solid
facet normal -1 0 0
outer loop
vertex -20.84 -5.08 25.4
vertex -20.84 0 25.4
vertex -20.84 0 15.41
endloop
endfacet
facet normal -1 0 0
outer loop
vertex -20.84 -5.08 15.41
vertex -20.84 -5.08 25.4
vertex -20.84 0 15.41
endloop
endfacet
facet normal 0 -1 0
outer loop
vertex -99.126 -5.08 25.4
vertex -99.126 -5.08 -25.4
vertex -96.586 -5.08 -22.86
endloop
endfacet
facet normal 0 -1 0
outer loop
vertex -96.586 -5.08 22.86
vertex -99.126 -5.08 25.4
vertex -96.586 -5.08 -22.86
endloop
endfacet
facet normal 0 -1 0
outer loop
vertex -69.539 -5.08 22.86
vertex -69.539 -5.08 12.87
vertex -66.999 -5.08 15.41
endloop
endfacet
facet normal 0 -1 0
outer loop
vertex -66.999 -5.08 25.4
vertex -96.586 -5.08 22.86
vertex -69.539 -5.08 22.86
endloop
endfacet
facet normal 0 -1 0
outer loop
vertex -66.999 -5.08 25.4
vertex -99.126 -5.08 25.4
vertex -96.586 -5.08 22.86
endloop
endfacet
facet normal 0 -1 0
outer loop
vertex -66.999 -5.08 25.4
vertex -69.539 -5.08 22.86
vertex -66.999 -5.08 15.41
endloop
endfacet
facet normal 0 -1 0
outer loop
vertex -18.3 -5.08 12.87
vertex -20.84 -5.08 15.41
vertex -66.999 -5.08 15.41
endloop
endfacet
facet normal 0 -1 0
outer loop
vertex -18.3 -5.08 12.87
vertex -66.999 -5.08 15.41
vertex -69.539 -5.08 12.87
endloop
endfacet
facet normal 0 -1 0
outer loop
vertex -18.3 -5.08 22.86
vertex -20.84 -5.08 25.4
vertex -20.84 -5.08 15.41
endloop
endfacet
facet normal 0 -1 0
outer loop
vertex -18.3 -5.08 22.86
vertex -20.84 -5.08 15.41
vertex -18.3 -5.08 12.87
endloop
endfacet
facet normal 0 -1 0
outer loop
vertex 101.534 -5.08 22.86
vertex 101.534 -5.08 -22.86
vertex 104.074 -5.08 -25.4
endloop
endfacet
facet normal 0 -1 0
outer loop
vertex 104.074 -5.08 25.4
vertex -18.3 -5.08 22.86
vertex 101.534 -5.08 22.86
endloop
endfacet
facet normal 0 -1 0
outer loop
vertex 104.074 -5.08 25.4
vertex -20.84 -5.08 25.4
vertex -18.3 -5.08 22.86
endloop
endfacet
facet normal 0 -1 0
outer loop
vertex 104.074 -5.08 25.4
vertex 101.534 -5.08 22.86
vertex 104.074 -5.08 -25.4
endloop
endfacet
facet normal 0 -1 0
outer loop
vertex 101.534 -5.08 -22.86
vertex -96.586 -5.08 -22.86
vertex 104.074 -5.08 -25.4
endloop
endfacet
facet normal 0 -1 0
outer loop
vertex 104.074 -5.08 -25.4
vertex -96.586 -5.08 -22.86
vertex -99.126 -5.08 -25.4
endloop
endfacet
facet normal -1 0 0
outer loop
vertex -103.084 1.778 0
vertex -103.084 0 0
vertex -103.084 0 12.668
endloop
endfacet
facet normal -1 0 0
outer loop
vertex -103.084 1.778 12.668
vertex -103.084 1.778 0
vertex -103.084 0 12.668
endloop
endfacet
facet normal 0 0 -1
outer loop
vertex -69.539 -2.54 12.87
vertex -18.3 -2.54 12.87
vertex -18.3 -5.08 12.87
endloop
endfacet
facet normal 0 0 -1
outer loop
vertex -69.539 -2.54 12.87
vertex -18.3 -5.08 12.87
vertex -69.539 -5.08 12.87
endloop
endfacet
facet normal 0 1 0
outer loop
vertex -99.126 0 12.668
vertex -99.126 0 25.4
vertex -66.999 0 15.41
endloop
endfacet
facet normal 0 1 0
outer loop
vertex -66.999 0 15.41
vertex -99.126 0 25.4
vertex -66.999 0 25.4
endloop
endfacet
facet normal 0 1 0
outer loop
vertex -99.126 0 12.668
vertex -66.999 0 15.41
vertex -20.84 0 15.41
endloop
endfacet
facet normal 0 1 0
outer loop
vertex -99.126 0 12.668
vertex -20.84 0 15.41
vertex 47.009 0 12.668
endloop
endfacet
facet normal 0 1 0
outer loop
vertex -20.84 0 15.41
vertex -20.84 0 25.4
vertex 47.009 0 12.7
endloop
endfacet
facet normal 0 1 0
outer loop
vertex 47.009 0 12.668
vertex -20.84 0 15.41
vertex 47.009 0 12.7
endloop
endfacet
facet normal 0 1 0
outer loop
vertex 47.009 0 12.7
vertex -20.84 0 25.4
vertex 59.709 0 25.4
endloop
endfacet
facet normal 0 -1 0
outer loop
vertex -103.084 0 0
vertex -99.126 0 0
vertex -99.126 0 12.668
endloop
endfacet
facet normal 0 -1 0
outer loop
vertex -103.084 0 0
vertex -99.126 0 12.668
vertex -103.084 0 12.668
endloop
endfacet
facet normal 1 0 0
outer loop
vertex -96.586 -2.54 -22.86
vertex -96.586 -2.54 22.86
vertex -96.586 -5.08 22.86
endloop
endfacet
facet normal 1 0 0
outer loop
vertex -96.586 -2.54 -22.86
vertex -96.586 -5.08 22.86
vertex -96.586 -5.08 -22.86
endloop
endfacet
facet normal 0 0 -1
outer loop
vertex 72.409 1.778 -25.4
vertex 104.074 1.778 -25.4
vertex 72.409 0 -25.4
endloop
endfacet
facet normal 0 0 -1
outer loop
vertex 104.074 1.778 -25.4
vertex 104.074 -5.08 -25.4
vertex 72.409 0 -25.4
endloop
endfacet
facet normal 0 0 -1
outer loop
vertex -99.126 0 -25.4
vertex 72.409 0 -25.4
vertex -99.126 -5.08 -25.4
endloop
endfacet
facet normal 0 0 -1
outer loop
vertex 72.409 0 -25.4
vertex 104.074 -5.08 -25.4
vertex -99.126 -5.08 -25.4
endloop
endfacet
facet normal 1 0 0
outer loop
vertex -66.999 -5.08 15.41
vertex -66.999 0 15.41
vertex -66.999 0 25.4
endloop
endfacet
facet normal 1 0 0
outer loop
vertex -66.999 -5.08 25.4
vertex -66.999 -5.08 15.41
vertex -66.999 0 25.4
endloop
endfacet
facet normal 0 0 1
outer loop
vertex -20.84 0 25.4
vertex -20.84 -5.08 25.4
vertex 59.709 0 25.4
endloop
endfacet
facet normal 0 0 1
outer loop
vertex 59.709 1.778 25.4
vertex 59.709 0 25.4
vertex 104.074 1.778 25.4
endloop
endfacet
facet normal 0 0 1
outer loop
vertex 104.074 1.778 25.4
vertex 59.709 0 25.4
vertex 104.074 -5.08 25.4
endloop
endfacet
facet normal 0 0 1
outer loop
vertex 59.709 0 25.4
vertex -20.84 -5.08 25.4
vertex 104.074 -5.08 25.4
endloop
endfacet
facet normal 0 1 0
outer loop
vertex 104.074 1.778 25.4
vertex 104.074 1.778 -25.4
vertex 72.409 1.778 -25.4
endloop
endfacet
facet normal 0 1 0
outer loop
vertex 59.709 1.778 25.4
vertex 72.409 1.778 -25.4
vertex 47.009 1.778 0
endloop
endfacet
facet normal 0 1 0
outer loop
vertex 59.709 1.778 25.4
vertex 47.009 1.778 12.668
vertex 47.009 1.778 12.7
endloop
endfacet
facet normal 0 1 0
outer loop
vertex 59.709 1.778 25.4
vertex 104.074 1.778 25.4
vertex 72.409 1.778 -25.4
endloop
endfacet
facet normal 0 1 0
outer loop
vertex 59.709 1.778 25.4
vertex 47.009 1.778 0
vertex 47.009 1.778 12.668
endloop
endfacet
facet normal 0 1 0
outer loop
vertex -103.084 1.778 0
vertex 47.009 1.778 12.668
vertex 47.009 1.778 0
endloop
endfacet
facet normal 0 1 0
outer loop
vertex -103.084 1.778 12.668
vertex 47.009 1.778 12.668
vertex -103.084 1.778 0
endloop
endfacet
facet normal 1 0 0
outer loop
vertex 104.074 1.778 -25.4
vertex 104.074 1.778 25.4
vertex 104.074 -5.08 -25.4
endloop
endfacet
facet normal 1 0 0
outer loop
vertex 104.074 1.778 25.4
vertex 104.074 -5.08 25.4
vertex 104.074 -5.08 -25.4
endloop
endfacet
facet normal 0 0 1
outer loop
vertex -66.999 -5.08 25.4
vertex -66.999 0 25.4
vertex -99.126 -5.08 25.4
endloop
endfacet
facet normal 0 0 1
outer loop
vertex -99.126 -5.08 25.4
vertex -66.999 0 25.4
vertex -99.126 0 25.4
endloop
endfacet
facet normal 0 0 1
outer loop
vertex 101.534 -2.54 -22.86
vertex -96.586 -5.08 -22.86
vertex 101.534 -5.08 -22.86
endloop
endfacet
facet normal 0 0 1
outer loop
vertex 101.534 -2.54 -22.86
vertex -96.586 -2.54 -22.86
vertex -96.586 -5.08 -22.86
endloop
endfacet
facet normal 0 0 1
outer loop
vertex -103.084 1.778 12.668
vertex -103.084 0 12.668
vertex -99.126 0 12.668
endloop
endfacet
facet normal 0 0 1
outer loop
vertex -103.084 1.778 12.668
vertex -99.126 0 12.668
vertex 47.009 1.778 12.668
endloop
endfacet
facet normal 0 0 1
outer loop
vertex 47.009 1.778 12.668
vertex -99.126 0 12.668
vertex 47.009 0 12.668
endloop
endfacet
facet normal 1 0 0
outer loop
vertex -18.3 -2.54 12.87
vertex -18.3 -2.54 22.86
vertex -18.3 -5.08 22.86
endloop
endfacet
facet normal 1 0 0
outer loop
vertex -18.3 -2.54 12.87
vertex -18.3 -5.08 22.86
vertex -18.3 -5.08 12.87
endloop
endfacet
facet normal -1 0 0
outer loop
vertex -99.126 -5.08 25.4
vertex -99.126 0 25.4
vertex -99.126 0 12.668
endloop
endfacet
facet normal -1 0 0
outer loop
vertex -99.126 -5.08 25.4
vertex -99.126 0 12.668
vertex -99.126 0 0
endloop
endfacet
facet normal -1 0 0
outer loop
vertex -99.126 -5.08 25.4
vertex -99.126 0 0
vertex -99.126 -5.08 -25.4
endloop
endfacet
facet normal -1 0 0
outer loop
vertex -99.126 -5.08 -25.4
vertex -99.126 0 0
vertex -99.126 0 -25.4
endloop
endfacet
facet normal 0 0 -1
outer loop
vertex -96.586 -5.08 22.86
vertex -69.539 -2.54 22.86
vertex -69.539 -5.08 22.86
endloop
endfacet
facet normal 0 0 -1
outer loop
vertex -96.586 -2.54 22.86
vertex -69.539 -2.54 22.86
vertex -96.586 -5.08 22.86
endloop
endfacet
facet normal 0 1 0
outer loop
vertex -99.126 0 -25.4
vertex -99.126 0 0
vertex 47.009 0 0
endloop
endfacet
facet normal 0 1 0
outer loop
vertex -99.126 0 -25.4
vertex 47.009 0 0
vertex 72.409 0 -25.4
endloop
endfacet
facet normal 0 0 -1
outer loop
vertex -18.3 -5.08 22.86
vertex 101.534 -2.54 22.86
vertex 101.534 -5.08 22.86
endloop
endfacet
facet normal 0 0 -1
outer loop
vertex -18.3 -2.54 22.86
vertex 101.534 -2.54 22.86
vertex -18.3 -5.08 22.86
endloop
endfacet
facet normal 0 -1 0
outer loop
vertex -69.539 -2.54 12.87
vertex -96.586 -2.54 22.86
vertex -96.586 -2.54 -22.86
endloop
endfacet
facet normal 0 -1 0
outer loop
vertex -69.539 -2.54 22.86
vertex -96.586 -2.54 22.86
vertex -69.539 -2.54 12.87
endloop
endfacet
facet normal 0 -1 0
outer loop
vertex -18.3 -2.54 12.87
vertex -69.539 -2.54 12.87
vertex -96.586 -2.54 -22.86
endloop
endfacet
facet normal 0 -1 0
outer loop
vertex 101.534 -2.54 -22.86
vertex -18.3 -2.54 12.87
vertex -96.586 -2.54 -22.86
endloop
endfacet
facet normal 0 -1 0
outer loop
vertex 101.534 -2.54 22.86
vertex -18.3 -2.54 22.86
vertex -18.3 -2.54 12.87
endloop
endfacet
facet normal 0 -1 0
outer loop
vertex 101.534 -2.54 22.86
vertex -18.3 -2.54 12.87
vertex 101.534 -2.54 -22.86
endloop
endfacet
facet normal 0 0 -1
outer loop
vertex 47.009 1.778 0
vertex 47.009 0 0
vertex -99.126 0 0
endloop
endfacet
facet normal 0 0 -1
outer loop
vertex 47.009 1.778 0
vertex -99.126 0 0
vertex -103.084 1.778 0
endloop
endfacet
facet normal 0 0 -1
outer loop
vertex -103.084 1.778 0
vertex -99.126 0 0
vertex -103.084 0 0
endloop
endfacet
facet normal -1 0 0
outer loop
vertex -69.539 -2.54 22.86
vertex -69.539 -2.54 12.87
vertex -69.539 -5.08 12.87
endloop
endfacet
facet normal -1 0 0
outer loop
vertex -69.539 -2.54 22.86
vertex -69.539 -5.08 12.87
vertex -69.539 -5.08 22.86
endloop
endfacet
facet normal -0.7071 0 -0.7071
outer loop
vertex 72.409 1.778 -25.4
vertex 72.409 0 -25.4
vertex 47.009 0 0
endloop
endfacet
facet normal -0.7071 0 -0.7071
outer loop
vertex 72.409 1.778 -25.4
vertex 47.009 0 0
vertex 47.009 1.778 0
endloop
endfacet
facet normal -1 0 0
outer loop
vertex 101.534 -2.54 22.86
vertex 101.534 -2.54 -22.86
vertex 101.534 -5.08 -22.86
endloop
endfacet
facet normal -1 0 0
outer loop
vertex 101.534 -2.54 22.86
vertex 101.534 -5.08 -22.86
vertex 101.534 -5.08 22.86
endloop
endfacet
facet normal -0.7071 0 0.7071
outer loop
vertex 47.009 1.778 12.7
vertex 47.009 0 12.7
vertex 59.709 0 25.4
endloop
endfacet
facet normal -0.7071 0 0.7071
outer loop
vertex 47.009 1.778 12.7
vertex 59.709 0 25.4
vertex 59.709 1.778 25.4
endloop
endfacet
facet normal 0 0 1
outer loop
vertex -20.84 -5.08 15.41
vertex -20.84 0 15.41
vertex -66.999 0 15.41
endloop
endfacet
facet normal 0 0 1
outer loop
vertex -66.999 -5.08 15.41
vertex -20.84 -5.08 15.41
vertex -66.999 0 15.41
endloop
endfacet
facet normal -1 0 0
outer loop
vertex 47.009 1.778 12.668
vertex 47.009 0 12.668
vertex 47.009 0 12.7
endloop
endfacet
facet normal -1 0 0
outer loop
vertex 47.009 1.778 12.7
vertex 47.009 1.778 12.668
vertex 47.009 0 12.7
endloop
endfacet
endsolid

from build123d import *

# Parameters (mm, degrees)
F1_DEPTH = 5.08
F2_T     = -2.54
F3_W     = 3.9589210415
F3_H     = 12.6681532711
F3_W_2   = 146.1344220674
F4_DEPTH = 1.778
F6_DEPTH = 1.778
F7_SIZE  = 12.7
F8_SIZE  = 25.39999


# Not quite as in the source:
# - a fillet or chamfer is up to 0.001 mm smaller than in the source, because OpenCascade refuses the exact size


with BuildPart() as f1:
    # F0 (on Front) → F1 (new body)
    with BuildSketch(Plane.XZ):
        Polygon((104.074490943, -25.4), (104.074490943, 25.4), (-20.8395591676, 25.4), (-20.8395591676, 15.409566462), (-66.9992624521, 15.409566462), (-66.9992624521, 25.4), (-99.125509057, 25.4), (-99.125509057, -25.4), align=None)
    extrude(amount=F1_DEPTH)

    # F2
    f2_openings = [f1.faces().sort_by_distance(p)[0] for p in [
        (4.64404, -5.08, -0.954203),
    ]]
    offset(amount=F2_T, openings=f2_openings, kind=Kind.INTERSECTION)

    # F3 (on face) → F4 (join)
    with BuildSketch(Plane(origin=(0, 0, 0), x_dir=(-1, 0, 0), z_dir=(0, 1, 0))):
        with Locations((101.1049695778, 6.3340766355)):
            Rectangle(F3_W, F3_H)
        with Locations((26.0582980233, 6.3340766355)):
            Rectangle(F3_W_2, F3_H)
    extrude(amount=F4_DEPTH)

    # F5 (on face) → F6 (join)
    with BuildSketch(Plane(origin=(0, 0, 0), x_dir=(-1, 0, 0), z_dir=(0, 1, 0))):
        Polygon((-47.0089130104, 12.6681532711), (-47.0089130104, 25.4), (-104.074490943, 25.4), (-104.074490943, -25.4), (-47.0089130104, -25.4), (-47.0089130104, 0), align=None)
    extrude(amount=F6_DEPTH)

    # F7
    f7_edges = [f1.edges().sort_by_distance(p)[0] for p in [
        (47.008913, 0.889, 25.4),
    ]]
    chamfer(f7_edges, length=F7_SIZE)

    # F8 (size 25.4 in the source; OpenCascade refuses exactly that, so slightly less here)
    f8_edges = [f1.edges().sort_by_distance(p)[0] for p in [
        (47.008913, 0.889, -25.4),
    ]]
    chamfer(f8_edges, length=F8_SIZE)


solid = f1.part
